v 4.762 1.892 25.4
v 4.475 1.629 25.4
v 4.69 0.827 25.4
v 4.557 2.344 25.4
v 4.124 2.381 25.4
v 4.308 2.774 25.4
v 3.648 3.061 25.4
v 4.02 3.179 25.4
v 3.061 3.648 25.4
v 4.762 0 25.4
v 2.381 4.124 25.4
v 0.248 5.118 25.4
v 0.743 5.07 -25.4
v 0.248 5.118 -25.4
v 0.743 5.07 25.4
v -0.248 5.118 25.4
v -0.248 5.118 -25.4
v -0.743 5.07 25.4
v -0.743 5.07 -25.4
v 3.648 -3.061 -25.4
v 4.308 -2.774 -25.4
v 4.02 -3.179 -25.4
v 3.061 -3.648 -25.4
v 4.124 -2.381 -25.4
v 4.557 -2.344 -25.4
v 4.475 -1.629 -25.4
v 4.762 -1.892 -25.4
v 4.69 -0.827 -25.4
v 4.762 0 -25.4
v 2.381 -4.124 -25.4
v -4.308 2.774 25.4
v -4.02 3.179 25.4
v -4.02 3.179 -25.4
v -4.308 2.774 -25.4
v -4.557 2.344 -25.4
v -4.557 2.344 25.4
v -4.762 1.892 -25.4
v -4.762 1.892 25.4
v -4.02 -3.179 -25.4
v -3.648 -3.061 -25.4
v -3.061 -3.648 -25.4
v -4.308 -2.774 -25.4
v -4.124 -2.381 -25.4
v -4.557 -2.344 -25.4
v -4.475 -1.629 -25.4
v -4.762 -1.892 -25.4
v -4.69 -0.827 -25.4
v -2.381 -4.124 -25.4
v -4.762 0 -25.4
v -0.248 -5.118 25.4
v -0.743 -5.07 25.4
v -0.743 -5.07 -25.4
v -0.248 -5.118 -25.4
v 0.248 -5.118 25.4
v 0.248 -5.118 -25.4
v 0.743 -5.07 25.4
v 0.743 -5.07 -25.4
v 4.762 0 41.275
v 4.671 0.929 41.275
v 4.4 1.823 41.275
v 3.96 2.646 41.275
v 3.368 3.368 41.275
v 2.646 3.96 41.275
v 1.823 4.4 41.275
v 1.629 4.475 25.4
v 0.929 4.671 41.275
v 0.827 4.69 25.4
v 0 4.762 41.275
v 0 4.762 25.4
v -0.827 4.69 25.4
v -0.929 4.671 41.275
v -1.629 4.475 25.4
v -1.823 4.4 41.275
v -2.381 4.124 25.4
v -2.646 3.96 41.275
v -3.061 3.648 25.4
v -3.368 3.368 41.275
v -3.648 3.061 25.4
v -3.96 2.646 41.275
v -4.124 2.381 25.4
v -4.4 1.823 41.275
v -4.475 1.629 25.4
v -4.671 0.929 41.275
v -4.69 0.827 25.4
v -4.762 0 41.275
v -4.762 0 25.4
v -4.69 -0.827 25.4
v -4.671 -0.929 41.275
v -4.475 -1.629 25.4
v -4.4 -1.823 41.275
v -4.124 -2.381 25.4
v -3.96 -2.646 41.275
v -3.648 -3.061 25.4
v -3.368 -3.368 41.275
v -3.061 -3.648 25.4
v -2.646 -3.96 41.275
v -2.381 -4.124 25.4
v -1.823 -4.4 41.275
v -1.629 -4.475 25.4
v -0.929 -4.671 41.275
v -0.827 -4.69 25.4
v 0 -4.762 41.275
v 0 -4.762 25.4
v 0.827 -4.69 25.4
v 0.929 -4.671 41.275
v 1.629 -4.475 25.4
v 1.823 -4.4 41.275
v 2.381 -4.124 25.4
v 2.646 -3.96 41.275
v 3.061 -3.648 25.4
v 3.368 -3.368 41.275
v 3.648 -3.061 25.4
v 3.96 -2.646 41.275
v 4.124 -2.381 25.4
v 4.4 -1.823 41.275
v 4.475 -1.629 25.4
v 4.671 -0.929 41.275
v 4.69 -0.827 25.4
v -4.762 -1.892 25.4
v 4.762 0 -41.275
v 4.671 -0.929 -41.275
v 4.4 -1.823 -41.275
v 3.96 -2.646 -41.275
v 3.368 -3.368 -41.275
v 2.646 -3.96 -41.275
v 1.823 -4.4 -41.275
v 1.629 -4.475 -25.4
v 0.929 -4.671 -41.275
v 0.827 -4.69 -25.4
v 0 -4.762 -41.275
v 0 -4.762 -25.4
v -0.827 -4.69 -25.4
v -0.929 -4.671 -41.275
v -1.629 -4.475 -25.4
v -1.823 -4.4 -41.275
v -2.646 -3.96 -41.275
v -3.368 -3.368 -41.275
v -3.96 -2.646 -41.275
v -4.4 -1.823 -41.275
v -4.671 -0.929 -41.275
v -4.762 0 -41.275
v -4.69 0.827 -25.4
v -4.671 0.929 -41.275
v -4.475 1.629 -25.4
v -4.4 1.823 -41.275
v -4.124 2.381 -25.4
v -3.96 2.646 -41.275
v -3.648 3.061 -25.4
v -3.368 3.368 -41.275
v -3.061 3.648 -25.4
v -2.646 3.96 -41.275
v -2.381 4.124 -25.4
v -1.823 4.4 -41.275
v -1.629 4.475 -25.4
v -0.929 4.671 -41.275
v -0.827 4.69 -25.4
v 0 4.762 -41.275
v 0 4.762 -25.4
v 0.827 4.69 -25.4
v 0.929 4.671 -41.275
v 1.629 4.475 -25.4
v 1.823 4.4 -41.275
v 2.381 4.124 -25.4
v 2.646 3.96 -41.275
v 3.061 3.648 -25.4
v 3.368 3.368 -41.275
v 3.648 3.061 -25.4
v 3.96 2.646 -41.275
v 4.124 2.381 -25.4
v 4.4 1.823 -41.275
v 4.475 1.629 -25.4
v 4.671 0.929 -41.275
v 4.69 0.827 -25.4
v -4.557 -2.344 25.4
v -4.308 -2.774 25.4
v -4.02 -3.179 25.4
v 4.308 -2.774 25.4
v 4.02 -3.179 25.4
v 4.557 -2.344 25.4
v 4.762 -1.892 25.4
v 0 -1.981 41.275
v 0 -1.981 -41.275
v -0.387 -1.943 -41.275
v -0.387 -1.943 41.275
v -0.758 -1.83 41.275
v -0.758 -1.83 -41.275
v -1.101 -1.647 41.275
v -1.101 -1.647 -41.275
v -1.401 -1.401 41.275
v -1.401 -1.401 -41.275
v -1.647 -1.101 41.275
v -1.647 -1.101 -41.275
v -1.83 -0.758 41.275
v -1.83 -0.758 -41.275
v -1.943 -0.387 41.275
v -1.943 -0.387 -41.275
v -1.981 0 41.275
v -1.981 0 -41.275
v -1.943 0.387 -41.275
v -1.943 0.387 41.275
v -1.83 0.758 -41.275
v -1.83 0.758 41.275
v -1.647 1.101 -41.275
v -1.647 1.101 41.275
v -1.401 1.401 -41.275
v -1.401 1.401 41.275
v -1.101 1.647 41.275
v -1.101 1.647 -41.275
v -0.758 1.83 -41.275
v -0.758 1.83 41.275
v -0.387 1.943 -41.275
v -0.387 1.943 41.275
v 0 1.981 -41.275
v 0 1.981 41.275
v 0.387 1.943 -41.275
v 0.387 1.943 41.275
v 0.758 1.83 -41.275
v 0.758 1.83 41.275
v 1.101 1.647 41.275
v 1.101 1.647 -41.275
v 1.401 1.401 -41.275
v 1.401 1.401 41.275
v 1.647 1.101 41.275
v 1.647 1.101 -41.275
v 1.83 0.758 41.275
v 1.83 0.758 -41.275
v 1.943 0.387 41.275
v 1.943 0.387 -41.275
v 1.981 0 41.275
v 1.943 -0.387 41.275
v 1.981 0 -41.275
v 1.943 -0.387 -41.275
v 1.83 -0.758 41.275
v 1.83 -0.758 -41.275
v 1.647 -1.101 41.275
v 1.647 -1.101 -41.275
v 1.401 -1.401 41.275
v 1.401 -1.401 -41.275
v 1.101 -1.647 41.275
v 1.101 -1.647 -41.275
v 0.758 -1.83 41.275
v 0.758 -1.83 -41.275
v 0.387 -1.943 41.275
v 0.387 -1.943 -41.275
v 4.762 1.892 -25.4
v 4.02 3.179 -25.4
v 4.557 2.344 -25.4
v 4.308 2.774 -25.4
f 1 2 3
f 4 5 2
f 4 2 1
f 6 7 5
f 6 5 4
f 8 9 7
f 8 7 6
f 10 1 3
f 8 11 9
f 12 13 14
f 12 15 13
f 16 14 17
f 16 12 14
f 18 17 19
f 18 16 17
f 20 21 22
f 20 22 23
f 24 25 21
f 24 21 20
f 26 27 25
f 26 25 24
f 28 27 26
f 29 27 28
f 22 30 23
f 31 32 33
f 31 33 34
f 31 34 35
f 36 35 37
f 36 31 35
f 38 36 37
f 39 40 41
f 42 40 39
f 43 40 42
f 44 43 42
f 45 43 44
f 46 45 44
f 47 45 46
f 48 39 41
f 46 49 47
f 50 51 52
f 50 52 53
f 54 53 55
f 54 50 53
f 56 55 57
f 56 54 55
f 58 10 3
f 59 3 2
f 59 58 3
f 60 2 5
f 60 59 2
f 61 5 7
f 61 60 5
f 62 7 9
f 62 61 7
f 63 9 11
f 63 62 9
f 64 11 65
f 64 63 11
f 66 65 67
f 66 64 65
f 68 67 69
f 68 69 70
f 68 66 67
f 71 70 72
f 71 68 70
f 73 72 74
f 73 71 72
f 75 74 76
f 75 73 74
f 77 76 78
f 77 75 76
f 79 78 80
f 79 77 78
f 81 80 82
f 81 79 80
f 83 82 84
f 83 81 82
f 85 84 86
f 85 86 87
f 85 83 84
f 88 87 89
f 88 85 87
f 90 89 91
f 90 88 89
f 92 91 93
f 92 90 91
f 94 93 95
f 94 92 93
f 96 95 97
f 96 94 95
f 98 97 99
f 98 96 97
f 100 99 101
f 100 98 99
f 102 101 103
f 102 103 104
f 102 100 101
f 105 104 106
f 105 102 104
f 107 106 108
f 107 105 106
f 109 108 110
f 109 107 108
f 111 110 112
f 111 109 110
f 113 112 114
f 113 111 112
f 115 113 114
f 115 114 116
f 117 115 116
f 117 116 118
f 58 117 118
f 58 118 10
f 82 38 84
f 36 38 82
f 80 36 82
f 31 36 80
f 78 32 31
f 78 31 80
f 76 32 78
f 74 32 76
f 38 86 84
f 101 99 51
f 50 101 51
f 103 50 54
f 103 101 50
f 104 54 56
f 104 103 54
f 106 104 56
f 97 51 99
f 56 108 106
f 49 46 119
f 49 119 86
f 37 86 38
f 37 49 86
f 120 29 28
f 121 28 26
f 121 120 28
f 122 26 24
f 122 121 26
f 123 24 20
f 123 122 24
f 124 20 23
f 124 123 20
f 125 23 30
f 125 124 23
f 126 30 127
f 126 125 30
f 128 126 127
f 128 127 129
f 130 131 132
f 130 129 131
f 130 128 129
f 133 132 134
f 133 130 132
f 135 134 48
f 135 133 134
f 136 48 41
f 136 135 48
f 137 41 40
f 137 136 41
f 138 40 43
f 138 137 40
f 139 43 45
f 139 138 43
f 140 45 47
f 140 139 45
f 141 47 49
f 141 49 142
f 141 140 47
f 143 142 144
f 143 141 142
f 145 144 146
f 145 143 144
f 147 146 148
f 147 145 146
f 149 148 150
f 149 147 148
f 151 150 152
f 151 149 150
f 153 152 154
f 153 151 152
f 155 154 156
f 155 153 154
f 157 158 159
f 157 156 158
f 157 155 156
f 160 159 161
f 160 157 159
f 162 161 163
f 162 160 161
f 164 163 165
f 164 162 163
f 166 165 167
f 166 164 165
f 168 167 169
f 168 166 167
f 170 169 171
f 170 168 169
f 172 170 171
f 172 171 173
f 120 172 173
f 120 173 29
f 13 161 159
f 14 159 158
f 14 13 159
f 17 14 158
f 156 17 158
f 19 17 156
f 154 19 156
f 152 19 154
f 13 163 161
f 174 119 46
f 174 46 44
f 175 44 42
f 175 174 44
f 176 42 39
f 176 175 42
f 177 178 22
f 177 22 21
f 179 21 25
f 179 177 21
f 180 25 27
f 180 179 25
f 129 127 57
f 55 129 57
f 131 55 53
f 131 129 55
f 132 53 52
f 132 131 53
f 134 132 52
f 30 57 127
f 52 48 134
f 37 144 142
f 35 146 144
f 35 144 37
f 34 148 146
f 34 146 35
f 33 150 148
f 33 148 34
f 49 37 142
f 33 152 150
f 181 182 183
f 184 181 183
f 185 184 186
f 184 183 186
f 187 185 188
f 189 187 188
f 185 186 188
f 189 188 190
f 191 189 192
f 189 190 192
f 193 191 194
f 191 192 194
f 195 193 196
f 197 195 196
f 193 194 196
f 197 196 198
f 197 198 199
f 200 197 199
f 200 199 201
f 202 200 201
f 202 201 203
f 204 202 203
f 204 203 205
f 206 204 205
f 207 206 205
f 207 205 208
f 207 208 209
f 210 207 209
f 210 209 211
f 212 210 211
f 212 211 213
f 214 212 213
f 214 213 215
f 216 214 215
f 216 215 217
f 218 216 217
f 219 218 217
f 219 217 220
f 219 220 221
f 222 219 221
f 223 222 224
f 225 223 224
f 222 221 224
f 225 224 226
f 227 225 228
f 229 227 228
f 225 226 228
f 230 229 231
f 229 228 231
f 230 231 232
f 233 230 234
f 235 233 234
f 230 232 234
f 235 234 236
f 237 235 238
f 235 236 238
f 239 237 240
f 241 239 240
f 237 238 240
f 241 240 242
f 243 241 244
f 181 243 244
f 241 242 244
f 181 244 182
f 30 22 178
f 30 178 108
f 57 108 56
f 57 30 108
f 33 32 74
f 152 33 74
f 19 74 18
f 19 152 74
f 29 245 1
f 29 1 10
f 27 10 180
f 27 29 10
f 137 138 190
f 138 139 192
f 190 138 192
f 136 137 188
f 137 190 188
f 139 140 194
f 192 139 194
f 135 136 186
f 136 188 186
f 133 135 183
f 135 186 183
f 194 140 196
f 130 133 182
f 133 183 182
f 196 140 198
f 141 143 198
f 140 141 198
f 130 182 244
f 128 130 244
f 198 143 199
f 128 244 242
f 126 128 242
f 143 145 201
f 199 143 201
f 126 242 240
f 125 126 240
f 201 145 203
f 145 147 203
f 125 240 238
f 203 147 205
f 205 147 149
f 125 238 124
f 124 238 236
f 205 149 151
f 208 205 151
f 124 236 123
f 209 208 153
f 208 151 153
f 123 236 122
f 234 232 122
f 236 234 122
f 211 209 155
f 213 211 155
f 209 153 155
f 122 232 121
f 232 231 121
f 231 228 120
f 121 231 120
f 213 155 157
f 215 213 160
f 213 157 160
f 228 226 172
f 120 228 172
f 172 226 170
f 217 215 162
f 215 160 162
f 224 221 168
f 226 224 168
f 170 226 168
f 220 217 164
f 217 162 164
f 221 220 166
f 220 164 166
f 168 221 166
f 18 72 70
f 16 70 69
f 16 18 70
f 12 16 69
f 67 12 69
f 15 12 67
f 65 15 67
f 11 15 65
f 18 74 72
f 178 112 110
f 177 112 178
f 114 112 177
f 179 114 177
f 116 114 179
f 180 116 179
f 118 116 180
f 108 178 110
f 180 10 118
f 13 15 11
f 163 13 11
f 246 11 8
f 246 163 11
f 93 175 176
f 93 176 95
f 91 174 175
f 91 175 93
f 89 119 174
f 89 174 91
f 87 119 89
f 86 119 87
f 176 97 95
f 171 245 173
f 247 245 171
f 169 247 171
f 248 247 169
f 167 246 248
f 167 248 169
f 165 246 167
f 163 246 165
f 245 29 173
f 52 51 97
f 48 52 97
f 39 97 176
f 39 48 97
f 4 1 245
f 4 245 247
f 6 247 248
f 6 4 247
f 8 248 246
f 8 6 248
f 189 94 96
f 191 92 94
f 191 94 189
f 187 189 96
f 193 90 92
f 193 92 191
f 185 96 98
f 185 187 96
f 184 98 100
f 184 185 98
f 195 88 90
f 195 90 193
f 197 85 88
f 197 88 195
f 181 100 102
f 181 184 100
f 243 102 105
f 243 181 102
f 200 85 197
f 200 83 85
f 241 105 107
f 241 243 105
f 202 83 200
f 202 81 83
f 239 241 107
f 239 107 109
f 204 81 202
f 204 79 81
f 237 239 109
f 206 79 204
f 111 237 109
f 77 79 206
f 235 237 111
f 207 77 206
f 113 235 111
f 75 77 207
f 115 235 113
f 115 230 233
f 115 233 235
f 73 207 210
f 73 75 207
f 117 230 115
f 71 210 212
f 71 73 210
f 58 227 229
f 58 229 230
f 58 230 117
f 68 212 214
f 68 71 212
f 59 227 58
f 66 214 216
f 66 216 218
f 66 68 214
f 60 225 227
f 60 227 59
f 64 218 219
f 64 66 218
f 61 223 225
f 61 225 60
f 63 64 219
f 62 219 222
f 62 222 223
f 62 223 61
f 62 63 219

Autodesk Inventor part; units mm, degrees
ref_plane "YZ Plane" through (0, 0, 0) normal (1, 0, 0) x (0, 1, 0)
ref_plane "XZ Plane" through (0, 0, 0) normal (0, 1, 0) x (-1, 0, 0)
ref_plane "XY Plane" through (0, 0, 0) normal (0, 0, 1) x (1, 0, 0)
sketch "Sketch1" plane through (0, 0, 0) normal (0, 0, 1) x (1, 0, 0)
  line L0 (-4.7625, -2.7496) -> (-4.7625, 2.7496)
  line L1 (-4.7625, 2.7496) -> (0, 5.4993)
  line L2 (0, 5.4993) -> (4.7625, 2.7496)
  line L3 (4.7625, 2.7496) -> (4.7625, -2.7496)
  line L4 (4.7625, -2.7496) -> (0, -5.4993)
  line L5 (0, -5.4993) -> (-4.7625, -2.7496)
  point P0 (0, 0)
  point P1 (0, 0)
  dimension "Size" = 9.525
extrude "Extrusion1" add sketch "Sketch1" along normal mid plane 82.55
sketch "Sketch3" plane through (0, 0, 41.275) normal (0, 0, 1) x (1, 0, 0)
  line L0 (-4.7625, 2.7496) -> (0, 5.4993) construction
  line L1 (0, 5.4993) -> (4.7625, 2.7496) construction
  line L2 (4.7625, 2.7496) -> (4.7625, -2.7496) construction
  line L3 (4.7625, -2.7496) -> (0, -5.4993) construction
  line L4 (0, -5.4993) -> (-4.7625, -2.7496) construction
  line L5 (-4.7625, -2.7496) -> (-4.7625, 2.7496) construction
  point P0 (0, 0)
hole "Hole1" at (0, 0, 41.275) direction (0, 0, -1) diameter 3.9624 end through all thread size "10-32 UNF" class "2B" standard "ANSI Unified Screw Threads"
sketch "Sketch4" plane through (0, 0, 41.275) normal (0, 0, 1) x (1, 0, 0)
  circle A0 centre (0, 0) radius 1.9812 construction
  line L0 (-4.7625, 2.7496) -> (0, 5.4993) construction
  line L1 (0, 5.4993) -> (4.7625, 2.7496) construction
  line L2 (4.7625, 2.7496) -> (4.7625, -2.7496) construction
  line L3 (4.7625, -2.7496) -> (0, -5.4993) construction
  line L4 (0, -5.4993) -> (-4.7625, -2.7496) construction
  line L5 (-4.7625, -2.7496) -> (-4.7625, 2.7496) construction
  circle A1 centre (0, 0) radius 5.1245
  circle A2 centre (0, 0) radius 8.89
  dimension "thunder" = 10.2489
  dimension "d16" = 17.78
extrude "Extrusion3" cut sketch "Sketch4" against normal through all
sketch "Sketch5" plane through (0, 0, 41.275) normal (0, 0, 1) x (1, 0, 0)
  circle A0 centre (0, 0) radius 1.9812 projected
  circle A1 centre (0, 0) radius 4.7625
  line L0 (4.7625, -1.8917) -> (4.7625, 1.8917) projected
  line L1 (4.0195, 3.1786) -> (0.743, 5.0703) projected
  line L2 (-0.743, 5.0703) -> (-4.0195, 3.1786) projected
  line L3 (-4.7625, 1.8917) -> (-4.7625, -1.8917) projected
  line L4 (-4.0195, -3.1786) -> (-0.743, -5.0703) projected
  line L5 (0.743, -5.0703) -> (4.0195, -3.1786) projected
  circle A2 centre (0, 0) radius 1.9812 projected
  arc A3 (4.0195, -3.1786) -> (4.7625, -1.8917) centre (0, 0) ccw projected
  arc A4 (4.7625, 1.8917) -> (4.0195, 3.1786) centre (0, 0) ccw projected
  arc A5 (0.743, 5.0703) -> (-0.743, 5.0703) centre (0, 0) ccw projected
  arc A6 (-4.0195, 3.1786) -> (-4.7625, 1.8917) centre (0, 0) ccw projected
  arc A7 (-4.7625, -1.8917) -> (-4.0195, -3.1786) centre (0, 0) ccw projected
  arc A8 (-0.743, -5.0703) -> (0.743, -5.0703) centre (0, 0) ccw projected
  point P0 (2.3813, -4.1244)
  point P1 (-2.3813, -4.1244)
  point P2 (-4.7625, 0)
  point P3 (-2.3813, 4.1244)
  point P4 (2.3812, 4.1244)
  point P5 (4.7625, 0)
  dimension "d21" = 9.525
extrude "Extrusion4" cut sketch "Sketch5" against normal blind 15.875 contours L0 A3 L5 A1 | A1 L1 A4 L0 | A1 L2 A5 L1 | L5 A8 L4 A1 | A1 L3 A6 L2 | L4 A7 L3 A1
mirror "Mirror2" about plane through (0, 0, 0) normal (0, 0, 1) of "Extrusion4"
equation "\"bearing\" = 25.4"
properties part number "GP10-012" material "Aluminum 6061"
